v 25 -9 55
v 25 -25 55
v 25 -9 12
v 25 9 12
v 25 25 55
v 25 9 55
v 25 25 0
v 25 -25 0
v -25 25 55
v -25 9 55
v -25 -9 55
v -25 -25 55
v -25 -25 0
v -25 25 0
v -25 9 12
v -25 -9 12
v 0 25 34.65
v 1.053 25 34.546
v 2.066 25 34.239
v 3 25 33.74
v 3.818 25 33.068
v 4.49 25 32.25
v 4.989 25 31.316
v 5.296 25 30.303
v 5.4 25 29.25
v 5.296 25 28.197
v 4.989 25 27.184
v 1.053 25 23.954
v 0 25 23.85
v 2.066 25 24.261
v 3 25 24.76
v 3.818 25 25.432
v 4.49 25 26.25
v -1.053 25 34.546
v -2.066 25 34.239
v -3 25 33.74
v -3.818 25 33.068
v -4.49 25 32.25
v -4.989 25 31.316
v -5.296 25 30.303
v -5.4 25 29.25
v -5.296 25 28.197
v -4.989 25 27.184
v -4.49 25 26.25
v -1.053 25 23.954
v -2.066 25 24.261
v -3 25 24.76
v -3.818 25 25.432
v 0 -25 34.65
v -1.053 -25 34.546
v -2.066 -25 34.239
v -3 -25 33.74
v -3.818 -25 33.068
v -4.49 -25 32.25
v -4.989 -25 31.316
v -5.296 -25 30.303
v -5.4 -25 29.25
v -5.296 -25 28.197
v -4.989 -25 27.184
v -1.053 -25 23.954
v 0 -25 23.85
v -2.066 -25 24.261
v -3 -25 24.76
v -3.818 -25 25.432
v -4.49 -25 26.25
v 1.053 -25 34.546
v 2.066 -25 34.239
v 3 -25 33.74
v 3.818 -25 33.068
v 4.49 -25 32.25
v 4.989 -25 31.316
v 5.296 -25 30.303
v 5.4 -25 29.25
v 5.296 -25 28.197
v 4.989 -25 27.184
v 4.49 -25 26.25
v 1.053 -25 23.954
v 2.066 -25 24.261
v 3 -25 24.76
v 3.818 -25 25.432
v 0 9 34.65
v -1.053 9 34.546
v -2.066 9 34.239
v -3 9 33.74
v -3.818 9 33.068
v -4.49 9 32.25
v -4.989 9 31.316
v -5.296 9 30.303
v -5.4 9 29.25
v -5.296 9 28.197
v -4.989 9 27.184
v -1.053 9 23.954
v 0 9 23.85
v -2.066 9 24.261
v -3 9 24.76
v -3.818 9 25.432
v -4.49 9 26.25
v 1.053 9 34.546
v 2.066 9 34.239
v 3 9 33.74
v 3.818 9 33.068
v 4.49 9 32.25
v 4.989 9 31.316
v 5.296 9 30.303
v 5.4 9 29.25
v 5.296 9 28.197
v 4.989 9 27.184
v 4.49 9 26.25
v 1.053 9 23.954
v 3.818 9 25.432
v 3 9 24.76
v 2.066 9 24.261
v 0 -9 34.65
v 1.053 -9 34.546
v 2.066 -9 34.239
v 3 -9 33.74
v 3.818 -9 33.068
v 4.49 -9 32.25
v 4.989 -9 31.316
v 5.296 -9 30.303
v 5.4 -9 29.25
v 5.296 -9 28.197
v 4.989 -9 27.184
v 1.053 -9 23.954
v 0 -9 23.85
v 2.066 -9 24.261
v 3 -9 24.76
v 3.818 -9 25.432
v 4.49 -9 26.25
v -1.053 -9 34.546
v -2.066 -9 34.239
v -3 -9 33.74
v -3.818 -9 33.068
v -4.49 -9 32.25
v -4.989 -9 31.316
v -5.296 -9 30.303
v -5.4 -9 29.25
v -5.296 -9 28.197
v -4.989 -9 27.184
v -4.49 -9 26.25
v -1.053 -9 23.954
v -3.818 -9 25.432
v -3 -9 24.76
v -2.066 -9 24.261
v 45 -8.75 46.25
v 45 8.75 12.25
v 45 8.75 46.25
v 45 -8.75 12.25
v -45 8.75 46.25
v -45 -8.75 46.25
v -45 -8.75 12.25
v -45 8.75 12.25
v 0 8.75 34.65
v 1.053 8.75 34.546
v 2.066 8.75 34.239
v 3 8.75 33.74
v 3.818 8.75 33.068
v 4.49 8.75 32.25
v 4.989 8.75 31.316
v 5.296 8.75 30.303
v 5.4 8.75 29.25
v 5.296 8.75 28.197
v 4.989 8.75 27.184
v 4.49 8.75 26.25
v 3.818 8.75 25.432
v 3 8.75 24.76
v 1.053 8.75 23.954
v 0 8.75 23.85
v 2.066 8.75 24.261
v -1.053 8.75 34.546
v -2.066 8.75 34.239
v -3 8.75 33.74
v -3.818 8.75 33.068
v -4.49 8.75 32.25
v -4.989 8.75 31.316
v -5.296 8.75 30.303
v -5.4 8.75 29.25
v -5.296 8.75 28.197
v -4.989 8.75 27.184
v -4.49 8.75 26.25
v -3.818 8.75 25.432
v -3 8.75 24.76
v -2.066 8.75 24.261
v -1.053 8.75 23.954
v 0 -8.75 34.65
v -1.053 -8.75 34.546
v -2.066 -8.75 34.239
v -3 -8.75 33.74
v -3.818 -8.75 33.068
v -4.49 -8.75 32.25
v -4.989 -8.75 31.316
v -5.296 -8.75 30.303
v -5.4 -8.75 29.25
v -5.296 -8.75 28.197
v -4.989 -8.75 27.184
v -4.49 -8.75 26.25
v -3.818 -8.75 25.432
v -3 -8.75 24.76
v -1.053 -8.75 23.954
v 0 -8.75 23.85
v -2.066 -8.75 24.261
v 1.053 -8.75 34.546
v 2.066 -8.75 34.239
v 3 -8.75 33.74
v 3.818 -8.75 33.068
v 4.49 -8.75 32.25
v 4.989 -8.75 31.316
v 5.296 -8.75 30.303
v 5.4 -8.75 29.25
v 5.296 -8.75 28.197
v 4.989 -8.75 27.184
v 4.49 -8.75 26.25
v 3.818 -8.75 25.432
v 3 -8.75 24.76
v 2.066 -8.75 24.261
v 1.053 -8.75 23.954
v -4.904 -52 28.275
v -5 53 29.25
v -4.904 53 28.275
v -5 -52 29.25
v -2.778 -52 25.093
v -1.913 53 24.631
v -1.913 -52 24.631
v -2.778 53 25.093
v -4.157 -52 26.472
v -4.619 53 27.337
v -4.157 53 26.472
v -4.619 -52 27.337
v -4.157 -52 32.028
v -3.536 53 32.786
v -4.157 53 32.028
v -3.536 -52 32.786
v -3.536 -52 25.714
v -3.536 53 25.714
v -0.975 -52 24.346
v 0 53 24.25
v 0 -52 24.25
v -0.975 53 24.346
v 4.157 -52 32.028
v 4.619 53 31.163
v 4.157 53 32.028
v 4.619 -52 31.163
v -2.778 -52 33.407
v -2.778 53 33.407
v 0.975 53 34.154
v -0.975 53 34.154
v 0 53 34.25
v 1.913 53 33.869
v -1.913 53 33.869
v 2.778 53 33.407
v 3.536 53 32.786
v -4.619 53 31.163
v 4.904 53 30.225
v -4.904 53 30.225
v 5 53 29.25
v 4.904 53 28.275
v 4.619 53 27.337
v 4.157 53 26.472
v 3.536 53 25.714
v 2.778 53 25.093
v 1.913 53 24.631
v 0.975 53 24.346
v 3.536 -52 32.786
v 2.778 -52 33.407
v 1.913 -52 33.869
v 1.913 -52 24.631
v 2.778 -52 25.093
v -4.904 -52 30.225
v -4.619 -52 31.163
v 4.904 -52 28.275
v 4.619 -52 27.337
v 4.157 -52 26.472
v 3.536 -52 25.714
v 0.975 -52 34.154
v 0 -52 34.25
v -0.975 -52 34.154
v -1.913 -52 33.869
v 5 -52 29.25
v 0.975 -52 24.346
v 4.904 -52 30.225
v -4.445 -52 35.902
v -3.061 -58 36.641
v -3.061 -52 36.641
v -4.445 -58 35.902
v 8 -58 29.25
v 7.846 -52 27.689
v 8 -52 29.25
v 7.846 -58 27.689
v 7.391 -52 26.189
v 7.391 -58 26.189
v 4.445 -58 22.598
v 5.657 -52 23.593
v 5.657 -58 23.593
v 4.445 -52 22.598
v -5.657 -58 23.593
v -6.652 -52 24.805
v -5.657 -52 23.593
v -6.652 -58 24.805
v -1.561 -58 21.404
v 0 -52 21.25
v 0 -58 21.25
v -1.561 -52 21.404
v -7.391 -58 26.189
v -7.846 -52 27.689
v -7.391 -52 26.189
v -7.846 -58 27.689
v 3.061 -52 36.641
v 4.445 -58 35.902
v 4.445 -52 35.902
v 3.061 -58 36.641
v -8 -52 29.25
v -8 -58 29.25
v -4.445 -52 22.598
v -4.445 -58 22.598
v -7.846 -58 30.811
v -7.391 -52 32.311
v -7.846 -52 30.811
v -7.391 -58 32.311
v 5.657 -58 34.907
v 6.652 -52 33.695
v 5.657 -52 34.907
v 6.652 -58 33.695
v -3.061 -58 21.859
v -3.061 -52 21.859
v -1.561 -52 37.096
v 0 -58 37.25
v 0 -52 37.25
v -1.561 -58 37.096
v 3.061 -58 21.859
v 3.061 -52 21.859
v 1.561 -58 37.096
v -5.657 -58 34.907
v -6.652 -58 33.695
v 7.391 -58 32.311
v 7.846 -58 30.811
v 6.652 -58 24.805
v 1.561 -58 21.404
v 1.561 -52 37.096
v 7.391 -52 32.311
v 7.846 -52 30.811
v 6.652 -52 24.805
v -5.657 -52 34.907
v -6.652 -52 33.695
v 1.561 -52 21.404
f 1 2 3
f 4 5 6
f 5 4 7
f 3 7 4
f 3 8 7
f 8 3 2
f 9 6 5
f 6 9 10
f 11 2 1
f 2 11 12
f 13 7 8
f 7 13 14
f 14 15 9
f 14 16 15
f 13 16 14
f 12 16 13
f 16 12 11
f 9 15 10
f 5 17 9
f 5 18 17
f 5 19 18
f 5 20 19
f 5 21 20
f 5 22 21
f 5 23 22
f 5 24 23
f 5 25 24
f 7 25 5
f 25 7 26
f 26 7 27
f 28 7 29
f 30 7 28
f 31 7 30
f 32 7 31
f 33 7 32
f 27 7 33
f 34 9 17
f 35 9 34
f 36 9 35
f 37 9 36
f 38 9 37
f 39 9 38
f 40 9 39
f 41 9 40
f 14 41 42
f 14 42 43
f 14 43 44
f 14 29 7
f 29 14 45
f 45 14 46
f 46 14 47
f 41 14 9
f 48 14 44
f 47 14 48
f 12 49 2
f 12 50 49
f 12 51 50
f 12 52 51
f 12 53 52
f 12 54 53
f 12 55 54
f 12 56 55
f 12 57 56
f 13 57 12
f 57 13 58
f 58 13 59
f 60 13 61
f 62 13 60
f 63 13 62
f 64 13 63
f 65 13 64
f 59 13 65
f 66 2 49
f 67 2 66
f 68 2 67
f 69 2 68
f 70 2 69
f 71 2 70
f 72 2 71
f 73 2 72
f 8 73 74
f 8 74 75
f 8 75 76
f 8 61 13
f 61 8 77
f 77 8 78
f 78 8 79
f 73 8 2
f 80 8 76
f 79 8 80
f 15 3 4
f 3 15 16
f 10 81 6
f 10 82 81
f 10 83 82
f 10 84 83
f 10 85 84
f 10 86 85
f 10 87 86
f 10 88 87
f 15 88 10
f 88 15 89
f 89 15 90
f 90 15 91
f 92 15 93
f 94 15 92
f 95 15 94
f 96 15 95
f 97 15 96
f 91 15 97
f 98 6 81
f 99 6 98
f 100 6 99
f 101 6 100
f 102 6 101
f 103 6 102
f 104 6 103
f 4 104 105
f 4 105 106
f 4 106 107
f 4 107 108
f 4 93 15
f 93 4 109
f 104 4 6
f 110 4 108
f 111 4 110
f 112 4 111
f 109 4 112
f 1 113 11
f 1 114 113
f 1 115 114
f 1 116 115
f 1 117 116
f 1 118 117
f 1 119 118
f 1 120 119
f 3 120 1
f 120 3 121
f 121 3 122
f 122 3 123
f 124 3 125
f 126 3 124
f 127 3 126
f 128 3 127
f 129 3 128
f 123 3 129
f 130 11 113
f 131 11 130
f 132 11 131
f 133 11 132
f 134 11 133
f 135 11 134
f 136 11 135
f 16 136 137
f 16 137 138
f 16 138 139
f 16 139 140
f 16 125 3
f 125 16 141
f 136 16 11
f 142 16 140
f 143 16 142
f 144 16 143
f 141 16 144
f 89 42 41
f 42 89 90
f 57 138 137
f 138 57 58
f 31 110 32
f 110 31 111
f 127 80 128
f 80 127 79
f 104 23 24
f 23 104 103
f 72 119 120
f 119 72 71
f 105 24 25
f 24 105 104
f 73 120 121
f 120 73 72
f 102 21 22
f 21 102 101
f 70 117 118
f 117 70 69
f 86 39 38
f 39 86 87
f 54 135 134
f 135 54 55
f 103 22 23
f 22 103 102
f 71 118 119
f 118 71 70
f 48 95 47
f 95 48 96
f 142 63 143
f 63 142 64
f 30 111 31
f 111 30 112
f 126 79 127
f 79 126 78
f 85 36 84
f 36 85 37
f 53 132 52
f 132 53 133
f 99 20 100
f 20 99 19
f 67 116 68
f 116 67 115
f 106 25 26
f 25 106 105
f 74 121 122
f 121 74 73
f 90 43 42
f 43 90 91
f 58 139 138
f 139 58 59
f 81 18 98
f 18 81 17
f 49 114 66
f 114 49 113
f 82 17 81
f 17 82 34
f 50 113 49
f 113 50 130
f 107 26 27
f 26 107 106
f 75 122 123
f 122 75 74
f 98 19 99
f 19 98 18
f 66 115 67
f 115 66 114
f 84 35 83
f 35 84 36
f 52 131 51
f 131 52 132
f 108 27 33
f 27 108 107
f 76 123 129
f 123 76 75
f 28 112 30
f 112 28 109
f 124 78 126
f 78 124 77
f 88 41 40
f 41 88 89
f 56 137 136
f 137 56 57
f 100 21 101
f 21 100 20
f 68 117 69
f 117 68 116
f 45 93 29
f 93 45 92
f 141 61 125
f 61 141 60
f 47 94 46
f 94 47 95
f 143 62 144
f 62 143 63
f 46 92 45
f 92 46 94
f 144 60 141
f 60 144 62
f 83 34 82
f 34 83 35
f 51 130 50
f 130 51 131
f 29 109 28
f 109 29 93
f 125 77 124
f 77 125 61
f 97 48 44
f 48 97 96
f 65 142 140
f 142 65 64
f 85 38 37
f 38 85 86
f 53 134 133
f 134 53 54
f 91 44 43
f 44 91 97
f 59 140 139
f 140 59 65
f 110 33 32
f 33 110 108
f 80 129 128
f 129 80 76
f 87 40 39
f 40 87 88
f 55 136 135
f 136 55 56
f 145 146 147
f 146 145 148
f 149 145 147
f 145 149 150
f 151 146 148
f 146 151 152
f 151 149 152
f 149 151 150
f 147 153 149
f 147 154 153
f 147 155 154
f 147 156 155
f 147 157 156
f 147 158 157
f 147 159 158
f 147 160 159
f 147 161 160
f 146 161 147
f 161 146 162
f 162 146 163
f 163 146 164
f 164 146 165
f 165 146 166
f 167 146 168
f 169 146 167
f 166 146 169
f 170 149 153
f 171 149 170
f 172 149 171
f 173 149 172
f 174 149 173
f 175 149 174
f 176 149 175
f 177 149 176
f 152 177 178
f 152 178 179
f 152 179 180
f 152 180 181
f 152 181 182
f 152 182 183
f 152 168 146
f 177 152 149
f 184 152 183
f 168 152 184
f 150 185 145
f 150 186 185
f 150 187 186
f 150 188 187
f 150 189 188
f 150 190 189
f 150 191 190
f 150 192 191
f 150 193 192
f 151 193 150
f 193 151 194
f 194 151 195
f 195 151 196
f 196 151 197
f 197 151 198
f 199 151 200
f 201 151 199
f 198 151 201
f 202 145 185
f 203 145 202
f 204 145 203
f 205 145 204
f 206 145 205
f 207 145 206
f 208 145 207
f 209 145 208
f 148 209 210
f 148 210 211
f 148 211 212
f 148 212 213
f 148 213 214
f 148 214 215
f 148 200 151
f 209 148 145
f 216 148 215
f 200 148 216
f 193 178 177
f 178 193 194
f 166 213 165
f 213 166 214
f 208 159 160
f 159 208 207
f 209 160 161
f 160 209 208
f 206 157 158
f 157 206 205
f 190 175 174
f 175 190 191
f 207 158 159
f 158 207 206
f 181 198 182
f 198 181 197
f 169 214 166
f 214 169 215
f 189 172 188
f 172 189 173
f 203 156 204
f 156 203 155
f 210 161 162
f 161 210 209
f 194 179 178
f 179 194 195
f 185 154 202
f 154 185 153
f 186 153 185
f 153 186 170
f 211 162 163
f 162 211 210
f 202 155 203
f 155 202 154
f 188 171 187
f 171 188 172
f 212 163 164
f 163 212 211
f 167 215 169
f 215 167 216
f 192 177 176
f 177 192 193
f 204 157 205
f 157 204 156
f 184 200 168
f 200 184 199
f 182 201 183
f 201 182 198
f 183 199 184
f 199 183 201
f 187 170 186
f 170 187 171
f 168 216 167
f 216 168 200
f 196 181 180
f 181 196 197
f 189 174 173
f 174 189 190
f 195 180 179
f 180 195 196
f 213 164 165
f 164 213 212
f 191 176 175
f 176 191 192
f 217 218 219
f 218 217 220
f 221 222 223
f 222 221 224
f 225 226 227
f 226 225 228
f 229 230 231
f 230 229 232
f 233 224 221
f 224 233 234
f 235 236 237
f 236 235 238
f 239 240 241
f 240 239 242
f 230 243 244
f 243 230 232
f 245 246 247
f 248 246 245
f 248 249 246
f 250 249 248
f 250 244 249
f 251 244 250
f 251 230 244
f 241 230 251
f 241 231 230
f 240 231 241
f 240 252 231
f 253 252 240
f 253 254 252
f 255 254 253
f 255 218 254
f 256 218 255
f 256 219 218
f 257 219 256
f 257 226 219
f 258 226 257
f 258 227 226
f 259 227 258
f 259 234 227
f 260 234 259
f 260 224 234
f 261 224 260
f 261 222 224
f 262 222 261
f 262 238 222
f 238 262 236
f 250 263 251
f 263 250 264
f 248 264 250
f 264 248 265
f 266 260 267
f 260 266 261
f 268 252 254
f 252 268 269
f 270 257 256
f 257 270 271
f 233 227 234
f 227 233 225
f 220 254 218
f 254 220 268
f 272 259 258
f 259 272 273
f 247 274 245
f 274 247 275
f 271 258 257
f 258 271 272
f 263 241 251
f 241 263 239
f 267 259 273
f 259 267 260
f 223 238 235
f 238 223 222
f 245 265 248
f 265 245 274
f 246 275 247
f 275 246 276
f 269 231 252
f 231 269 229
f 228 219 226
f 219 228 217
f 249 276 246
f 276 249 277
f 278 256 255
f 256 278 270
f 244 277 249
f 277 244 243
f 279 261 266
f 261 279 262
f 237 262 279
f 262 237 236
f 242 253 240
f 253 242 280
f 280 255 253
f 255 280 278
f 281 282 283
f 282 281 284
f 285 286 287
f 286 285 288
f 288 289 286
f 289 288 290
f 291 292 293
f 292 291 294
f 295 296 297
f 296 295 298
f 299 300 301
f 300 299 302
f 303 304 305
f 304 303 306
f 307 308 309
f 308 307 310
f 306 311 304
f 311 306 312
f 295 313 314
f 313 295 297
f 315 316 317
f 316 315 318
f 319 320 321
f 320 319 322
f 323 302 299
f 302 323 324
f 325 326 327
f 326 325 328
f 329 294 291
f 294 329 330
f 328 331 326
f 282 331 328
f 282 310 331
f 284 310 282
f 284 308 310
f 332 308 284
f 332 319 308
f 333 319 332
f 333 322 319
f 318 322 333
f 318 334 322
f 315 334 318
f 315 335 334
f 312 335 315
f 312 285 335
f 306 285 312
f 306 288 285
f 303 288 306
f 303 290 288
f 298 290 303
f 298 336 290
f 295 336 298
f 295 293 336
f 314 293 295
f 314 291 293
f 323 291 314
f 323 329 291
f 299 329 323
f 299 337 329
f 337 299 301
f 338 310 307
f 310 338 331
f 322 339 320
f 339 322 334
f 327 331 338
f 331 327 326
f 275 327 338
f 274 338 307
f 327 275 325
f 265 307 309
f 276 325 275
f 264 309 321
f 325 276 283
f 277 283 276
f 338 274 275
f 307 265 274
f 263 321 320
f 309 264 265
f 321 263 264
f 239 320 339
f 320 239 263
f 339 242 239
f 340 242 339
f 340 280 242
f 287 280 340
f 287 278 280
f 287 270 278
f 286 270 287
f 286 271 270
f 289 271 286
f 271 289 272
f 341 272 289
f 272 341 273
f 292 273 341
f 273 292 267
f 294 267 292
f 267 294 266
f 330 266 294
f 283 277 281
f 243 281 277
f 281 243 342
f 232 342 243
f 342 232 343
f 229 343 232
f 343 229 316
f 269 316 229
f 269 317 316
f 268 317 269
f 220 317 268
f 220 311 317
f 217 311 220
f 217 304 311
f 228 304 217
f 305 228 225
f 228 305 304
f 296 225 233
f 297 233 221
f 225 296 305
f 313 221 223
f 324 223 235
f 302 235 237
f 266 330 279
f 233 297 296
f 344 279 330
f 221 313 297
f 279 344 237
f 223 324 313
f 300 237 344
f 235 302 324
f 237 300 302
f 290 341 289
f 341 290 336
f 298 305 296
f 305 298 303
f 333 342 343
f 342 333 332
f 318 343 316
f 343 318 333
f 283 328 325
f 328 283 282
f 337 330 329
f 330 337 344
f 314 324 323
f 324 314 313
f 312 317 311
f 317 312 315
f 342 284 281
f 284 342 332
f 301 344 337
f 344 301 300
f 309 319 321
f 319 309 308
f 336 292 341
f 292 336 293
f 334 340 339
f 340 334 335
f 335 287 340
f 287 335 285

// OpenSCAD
$fn = 32;

// ------------------------------------------------------------------------
// Clevis joint: 50 mm clevis, pin d10
// Every part is its own module, assembly() places them once.
// ------------------------------------------------------------------------

// --- part 1 ---
module clevis() {
  difference() {
    translate([-25, -25, 0]) cube([50, 50, 55]);
    translate([-26, -9, 12]) cube([52, 18, 44]);
    translate([0, 0, 29.25]) rotate([90, 0, 0]) cylinder(h = 52, d = 10.8, center = true);
  }
}

// --- part 2 ---
module eye() {
  difference() {
    translate([-45, -8.75, 0]) cube([90, 17.5, 34]);
    translate([0, 0, 17]) rotate([90, 0, 0]) cylinder(h = 19.5, d = 10.8, center = true);
  }
}

// --- part 3 ---
module pin() {
  rotate([0, 90, 0]) cylinder(h = 106, d = 10, center = true);
  translate([-58, 0, 0]) rotate([0, 90, 0]) cylinder(h = 6, d = 16);
}

// --- assembly ---
module assembly() {
  translate([0, 0, 0]) rotate([0, 0, 0]) clevis();
  translate([0, 0, 12.25]) rotate([0, 0, 0]) eye();
  translate([0, 0, 29.25]) rotate([0, 0, 90]) pin();
}

assembly();
